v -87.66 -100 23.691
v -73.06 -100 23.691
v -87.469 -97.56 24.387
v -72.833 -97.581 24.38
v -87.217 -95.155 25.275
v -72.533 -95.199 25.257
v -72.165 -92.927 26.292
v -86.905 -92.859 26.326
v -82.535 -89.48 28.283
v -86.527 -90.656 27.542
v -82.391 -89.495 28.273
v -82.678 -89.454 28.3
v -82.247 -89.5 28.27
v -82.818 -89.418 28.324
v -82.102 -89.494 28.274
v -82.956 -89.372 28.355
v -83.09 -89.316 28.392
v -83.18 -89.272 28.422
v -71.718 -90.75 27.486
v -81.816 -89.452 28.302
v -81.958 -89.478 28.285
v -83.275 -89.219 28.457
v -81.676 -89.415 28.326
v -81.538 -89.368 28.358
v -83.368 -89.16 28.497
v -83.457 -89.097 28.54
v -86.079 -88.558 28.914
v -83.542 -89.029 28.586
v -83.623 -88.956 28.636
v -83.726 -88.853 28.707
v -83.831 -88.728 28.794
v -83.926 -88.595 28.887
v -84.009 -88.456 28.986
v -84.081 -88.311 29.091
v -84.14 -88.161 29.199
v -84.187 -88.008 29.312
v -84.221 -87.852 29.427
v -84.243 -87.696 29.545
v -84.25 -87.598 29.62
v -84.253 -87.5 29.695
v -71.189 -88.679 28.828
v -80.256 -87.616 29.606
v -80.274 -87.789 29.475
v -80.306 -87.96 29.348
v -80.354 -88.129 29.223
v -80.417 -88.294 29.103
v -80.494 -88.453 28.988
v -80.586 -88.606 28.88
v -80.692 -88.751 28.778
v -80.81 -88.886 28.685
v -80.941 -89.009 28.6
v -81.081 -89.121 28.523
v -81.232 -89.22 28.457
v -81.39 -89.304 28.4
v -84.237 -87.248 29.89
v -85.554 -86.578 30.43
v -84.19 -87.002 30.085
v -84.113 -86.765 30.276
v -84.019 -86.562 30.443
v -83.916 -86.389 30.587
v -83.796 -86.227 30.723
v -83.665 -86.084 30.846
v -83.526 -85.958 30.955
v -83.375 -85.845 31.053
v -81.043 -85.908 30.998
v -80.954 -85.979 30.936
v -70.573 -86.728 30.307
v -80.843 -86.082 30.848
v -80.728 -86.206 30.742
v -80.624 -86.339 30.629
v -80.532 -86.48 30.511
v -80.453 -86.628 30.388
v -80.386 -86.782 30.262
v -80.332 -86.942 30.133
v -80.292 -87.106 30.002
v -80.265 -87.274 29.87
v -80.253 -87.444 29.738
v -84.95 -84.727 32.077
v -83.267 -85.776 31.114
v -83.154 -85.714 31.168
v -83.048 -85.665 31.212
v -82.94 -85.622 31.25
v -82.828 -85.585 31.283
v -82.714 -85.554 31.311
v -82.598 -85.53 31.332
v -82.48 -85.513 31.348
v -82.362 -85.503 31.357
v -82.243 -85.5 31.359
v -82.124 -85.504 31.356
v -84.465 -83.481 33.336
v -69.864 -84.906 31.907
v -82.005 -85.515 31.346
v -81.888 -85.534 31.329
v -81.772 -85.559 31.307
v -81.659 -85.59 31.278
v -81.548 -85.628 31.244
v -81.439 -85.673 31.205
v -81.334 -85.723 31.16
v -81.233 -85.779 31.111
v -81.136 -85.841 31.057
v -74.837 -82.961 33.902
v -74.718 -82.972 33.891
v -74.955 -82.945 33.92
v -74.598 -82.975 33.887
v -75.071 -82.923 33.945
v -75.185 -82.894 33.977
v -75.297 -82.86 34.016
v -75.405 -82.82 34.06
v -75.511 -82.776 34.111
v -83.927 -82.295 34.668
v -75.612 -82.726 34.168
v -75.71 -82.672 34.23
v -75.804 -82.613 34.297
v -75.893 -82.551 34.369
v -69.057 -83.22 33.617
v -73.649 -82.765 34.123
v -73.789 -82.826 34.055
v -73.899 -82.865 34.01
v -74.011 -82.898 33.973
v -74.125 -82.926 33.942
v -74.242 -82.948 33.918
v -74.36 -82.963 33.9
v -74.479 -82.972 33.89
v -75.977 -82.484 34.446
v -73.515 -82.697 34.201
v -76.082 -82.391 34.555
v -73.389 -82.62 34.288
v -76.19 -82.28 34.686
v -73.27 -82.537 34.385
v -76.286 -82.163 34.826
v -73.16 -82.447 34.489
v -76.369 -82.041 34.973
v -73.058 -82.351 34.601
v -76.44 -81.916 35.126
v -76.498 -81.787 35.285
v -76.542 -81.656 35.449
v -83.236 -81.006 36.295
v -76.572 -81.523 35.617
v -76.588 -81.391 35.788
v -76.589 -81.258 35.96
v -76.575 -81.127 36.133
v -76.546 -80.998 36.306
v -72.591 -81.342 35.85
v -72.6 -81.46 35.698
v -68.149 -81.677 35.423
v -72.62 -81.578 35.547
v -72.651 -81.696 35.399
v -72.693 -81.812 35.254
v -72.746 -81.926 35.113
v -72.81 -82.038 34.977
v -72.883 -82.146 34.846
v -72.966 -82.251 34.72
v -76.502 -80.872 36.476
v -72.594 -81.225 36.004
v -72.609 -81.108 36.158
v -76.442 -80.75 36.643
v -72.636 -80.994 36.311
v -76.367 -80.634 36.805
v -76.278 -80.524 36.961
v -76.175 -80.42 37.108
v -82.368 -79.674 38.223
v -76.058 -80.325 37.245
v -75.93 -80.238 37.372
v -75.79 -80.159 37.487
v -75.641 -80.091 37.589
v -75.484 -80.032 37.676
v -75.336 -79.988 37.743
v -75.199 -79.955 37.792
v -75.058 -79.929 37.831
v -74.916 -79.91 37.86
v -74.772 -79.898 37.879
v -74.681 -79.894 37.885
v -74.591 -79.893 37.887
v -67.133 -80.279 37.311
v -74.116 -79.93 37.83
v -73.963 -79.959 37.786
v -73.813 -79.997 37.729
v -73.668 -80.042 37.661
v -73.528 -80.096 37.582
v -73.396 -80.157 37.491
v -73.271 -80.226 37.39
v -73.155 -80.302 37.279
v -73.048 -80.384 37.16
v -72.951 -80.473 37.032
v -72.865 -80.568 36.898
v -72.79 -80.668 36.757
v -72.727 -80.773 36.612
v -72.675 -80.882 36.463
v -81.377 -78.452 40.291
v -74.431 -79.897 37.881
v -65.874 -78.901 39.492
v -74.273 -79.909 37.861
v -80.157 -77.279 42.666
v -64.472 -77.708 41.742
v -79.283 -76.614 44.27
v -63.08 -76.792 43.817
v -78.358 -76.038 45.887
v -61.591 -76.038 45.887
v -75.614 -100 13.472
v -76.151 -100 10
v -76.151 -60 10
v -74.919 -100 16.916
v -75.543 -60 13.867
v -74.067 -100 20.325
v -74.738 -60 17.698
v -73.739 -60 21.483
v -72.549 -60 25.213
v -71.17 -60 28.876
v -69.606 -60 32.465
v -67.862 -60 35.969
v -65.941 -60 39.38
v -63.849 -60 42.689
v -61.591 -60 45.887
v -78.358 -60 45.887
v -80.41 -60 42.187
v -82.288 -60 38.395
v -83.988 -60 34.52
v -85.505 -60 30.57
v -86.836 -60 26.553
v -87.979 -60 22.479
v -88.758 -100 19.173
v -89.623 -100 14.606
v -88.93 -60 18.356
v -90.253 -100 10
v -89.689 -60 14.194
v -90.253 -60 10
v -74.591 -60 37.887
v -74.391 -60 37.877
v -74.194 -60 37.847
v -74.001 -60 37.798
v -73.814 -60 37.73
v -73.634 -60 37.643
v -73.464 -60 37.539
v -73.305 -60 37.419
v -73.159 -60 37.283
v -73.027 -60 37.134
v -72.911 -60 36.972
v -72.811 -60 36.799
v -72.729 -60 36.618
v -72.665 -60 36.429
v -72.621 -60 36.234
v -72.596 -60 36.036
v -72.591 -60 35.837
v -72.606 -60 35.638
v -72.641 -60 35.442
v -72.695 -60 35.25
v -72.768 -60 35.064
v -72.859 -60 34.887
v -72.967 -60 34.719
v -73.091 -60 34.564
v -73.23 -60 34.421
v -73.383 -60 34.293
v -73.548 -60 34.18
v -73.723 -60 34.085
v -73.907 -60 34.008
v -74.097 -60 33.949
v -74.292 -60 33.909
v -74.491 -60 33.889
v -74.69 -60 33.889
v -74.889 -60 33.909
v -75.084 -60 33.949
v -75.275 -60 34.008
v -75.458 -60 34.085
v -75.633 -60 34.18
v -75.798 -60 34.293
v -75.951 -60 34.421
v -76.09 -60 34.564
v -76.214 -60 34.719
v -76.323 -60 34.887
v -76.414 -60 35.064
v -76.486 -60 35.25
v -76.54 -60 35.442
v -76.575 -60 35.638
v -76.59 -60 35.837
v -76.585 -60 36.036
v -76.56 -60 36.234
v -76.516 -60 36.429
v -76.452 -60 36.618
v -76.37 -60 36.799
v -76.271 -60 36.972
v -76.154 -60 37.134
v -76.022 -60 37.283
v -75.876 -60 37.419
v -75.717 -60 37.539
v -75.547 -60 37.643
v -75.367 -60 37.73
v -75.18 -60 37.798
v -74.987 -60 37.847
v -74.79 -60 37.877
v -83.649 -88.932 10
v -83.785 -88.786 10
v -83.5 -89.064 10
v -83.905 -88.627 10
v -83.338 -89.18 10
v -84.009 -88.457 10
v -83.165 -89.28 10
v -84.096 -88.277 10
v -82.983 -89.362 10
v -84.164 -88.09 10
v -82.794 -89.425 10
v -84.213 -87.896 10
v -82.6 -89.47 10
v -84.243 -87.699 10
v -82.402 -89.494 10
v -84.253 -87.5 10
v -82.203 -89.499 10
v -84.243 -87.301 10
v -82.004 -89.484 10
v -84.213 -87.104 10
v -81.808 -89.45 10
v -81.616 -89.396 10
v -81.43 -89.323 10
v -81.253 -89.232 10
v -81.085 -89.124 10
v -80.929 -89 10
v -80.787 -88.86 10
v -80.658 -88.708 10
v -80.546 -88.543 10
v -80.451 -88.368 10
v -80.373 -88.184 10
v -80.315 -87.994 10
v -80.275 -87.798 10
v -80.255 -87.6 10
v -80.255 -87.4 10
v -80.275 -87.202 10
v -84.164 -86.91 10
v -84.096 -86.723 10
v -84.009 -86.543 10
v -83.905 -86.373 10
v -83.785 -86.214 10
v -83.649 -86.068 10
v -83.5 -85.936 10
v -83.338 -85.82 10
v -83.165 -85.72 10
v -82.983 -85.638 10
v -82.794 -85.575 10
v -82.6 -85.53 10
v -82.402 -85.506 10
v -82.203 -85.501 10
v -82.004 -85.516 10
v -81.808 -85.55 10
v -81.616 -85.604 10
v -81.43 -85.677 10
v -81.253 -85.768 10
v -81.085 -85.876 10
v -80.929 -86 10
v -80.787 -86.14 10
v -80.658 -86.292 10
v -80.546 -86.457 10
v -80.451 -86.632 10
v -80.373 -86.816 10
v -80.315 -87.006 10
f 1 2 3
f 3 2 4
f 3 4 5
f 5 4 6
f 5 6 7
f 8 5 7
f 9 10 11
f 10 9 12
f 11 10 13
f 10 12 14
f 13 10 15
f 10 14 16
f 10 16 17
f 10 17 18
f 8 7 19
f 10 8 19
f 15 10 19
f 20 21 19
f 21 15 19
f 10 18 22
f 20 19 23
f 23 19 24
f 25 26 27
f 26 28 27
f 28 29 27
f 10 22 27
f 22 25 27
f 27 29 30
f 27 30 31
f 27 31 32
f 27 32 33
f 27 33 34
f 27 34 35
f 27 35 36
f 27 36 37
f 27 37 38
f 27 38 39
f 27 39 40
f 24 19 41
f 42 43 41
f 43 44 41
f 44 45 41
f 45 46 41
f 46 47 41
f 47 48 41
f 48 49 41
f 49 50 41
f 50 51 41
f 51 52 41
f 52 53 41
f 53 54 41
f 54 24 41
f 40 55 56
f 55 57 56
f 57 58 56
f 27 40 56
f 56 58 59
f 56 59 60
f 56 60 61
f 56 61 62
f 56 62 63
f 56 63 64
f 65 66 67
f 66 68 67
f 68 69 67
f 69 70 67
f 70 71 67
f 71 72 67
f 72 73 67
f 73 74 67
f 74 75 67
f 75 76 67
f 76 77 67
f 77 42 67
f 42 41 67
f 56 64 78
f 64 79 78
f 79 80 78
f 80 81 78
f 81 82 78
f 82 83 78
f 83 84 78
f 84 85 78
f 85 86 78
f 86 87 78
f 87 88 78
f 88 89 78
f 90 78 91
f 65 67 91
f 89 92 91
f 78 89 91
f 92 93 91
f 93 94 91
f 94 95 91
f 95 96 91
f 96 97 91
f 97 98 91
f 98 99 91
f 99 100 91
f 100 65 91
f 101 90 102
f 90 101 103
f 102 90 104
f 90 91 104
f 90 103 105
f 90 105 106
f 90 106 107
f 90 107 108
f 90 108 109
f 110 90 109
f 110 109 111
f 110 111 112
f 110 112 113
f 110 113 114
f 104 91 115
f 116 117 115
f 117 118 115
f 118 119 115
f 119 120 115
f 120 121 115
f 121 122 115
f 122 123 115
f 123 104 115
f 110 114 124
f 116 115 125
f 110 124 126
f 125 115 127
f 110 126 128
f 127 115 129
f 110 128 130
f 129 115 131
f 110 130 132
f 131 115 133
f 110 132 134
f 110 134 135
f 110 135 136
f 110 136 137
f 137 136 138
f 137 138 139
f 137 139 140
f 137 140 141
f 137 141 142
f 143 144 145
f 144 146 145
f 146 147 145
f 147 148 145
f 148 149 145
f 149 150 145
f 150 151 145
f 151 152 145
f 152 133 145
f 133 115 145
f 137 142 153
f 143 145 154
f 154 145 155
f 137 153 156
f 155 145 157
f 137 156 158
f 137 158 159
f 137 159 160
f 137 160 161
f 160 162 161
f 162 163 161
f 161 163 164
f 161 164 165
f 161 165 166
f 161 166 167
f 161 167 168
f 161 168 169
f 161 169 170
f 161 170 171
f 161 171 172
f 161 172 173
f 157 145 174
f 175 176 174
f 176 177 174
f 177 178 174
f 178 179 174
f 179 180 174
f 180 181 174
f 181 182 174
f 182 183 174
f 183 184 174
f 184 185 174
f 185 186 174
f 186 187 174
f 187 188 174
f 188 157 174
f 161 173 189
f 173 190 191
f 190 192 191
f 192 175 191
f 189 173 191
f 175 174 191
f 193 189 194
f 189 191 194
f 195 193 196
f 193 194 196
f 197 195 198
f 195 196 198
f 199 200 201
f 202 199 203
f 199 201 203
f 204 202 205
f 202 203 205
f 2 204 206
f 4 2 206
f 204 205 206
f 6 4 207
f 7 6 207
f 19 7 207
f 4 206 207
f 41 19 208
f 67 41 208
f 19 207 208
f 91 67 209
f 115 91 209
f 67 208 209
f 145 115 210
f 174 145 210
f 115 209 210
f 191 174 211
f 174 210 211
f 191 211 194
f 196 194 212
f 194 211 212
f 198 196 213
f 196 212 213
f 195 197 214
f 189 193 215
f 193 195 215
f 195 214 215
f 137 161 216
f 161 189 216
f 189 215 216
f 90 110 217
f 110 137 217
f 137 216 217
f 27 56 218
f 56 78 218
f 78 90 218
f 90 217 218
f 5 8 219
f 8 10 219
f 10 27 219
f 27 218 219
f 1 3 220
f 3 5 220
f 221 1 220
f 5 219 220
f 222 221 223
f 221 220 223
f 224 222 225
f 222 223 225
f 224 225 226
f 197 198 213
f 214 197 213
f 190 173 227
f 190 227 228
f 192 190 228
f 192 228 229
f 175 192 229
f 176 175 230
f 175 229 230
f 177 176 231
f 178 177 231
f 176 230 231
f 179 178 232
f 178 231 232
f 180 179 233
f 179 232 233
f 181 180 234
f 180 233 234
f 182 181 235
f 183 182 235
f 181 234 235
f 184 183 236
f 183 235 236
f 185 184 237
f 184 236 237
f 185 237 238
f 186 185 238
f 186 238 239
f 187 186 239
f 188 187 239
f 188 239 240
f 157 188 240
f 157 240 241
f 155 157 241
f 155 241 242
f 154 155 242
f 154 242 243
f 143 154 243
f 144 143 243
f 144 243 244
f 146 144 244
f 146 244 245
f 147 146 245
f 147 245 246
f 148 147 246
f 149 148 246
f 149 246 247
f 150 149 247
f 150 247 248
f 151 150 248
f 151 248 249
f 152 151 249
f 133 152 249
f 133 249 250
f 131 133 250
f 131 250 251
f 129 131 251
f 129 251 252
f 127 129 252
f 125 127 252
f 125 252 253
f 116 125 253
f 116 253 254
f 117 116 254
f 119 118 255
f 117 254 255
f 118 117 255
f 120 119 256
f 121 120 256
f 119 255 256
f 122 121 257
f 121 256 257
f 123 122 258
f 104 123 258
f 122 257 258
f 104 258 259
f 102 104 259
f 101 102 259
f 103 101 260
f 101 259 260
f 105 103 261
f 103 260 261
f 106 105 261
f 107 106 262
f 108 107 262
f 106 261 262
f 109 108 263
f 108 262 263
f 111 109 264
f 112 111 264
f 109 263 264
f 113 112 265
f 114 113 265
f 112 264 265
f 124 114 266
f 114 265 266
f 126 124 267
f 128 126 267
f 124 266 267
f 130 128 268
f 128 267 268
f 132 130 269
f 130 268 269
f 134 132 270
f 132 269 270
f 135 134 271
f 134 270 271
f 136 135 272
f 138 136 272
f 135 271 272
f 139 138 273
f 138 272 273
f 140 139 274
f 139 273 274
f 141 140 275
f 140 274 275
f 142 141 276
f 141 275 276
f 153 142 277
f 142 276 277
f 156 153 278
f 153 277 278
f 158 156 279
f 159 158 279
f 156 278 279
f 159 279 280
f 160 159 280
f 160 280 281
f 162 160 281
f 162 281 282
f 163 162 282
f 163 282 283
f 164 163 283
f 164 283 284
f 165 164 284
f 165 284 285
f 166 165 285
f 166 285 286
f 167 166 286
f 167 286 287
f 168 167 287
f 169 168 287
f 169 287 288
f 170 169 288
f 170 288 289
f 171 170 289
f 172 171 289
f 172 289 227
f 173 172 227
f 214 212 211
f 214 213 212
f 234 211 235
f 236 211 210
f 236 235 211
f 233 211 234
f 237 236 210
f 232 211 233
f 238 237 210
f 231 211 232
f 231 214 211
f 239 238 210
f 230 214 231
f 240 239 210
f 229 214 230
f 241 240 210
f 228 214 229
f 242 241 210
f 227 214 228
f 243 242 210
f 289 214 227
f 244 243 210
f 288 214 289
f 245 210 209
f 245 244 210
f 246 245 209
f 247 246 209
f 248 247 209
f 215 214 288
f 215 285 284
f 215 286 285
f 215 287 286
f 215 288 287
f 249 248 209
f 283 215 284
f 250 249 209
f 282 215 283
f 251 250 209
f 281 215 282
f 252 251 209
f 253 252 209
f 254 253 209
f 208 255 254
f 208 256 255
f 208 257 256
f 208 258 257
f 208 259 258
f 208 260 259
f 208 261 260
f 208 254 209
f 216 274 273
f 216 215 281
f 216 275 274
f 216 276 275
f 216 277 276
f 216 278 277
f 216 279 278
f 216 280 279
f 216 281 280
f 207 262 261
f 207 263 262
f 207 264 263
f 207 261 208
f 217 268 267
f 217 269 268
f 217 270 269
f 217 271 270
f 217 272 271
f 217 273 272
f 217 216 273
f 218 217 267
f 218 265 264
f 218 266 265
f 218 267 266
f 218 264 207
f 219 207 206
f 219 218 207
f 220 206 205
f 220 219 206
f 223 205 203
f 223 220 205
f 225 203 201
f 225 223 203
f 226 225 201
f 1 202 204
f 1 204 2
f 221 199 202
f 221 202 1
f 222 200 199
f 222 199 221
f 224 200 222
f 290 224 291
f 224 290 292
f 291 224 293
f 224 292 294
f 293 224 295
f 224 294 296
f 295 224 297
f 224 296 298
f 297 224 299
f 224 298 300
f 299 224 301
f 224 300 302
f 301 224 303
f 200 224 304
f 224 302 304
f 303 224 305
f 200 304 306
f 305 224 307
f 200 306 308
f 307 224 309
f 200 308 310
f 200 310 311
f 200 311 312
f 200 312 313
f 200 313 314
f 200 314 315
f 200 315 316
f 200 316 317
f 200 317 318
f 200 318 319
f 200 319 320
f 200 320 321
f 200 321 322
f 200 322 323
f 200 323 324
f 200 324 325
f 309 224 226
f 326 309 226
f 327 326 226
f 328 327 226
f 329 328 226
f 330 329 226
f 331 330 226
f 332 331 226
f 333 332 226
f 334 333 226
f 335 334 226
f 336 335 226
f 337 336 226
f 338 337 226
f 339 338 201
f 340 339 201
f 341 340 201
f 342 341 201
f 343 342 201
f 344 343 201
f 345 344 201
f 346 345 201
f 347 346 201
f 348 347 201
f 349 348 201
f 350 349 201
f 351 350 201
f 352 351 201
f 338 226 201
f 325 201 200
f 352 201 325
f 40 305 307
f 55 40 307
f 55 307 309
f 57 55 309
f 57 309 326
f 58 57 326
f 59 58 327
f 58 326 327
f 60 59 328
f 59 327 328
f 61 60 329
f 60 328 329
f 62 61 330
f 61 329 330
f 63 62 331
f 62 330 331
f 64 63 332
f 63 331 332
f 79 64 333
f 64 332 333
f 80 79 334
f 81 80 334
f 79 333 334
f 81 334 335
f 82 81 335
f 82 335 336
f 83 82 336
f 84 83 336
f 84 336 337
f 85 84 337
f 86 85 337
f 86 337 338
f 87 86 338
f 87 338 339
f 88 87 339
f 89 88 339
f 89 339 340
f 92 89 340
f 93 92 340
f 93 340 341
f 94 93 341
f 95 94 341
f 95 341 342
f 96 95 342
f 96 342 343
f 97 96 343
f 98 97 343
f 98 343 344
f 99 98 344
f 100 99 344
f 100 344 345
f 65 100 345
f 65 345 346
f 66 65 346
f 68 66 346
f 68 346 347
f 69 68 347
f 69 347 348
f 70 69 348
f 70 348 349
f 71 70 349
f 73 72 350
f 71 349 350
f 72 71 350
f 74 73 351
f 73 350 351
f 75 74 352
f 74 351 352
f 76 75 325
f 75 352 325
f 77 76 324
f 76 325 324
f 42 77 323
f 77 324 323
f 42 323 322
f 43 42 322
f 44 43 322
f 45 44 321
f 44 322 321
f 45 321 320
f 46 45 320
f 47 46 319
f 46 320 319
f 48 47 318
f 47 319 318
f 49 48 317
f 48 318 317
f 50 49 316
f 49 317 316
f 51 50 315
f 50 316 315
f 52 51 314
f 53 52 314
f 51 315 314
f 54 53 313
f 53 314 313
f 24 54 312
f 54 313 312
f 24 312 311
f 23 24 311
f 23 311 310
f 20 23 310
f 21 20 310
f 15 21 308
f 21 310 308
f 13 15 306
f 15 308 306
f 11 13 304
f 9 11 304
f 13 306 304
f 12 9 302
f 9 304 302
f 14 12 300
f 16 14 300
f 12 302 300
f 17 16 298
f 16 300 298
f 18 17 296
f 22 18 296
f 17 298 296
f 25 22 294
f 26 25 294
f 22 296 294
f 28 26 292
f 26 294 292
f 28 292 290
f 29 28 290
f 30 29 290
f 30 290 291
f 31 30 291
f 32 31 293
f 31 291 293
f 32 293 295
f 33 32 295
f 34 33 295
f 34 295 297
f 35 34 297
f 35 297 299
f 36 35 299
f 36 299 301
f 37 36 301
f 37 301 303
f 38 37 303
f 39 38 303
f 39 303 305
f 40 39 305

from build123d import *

# Parameters (mm, degrees)
BOSS_EXTRUDE1_DEPTH      = 60
SKETCH25_W               = 5.5
SKETCH25_H               = 17
BOSS_EXTRUDE3_DEPTH      = 20
FILLET1_R                = 2.3
SKETCH28_W               = 8
SKETCH28_H               = 10
CUT_EXTRUDE17_DEPTH      = 265
CUT_EXTRUDE19_DEPTH      = 165.638713704
CUT_EXTRUDE19_DEPTH_BACK = 165.638713704
SKETCH30_W               = 183.61
SKETCH30_H               = 30
CUT_EXTRUDE20_DEPTH      = 165.638713704
CUT_EXTRUDE20_DEPTH_BACK = 165.638713704
SKETCH32_W               = 3
SKETCH32_H               = 14
BOSS_EXTRUDE4_DEPTH      = 40
CUT_EXTRUDE21_DEPTH      = 90
CUT_EXTRUDE22_DEPTH      = 164.320868502
CUT_EXTRUDE22_DEPTH_BACK = 164.320868502
SKETCH39_R               = 2
CUT_EXTRUDE23_DEPTH      = 88
SKETCH40_R               = 2
CUT_EXTRUDE24_DEPTH      = 88


with BuildPart() as part:
    # Sketch1 → Boss-Extrude1 (new body)
    with BuildSketch(Plane(origin=(0, 0, 0), x_dir=(1, 0, 0), z_dir=(0, 1, 0))):
        with BuildLine():
            Line((91.805, -10), (90.252689849, -10))
            ThreePointArc((90.252689849, -10), (0, -90.805), (-90.252689849, -10))
            Line((-90.252689849, -10), (-91.805, -10))
            Line((-91.805, -10), (-91.805, 20))
            Line((-91.805, 20), (-76.805, 20))
            Line((-76.805, 20), (-76.805, 0))
            ThreePointArc((-76.805, 0), (0, -76.805), (76.805, 0))
            Line((76.805, 0), (76.805, 20))
            Line((76.805, 20), (91.805, 20))
            Line((91.805, 20), (91.805, -10))
        make_face()
    extrude(amount=-BOSS_EXTRUDE1_DEPTH)

    # Sketch25 → Boss-Extrude3 (add)
    with BuildSketch(Plane(origin=(0, -60, 0), x_dir=(-1, 0, 0), z_dir=(0, -1, 0))):
        with Locations((84.305, 5)):
            Rectangle(SKETCH25_W, SKETCH25_H)
        with Locations((-84.305, 5)):
            Rectangle(SKETCH25_W, SKETCH25_H)
    extrude(amount=BOSS_EXTRUDE3_DEPTH)

    # Fillet1
    fillet1_edges = [part.edges().sort_by_distance(p)[0] for p in [
        (84.305, -60, 3.5),
        (81.555, -60, -5),
        (87.055, -60, -5),
        (84.305, -60, -13.5),
        (-84.305, -60, 3.5),
        (-87.055, -60, -5),
        (-81.555, -60, -5),
        (-84.305, -60, -13.5),
    ]]
    fillet(fillet1_edges, radius=FILLET1_R)

    # Sketch28 → Cut-Extrude17 (cut)
    with BuildSketch(Plane(origin=(91.805, 0, 0), x_dir=(0, 0, -1), z_dir=(1, 0, 0))):
        with Locations((5, -42)):
            Rectangle(SKETCH28_W, SKETCH28_H)
    extrude(amount=-CUT_EXTRUDE17_DEPTH, mode=Mode.SUBTRACT)

    # Sketch30 → Cut-Extrude19 (cut, two sides: drawn at the far end of the back side and taken through both)
    with BuildSketch(Plane(origin=(0, 0, -20), x_dir=(-1, 0, 0), z_dir=(0, 0, -1)).offset(-CUT_EXTRUDE19_DEPTH_BACK)):
        with Locations((0, -15)):
            Rectangle(SKETCH30_W, SKETCH30_H)
    extrude(amount=CUT_EXTRUDE19_DEPTH + CUT_EXTRUDE19_DEPTH_BACK, mode=Mode.SUBTRACT)

    # Sketch32 → Cut-Extrude20 (cut, two sides: drawn at the far end of the back side and taken through both)
    with BuildSketch(Plane(origin=(0, 0, -20), x_dir=(-1, 0, 0), z_dir=(0, 0, -1)).offset(-CUT_EXTRUDE20_DEPTH_BACK)):
        with Locations((-65.13523483, -44)):
            Rectangle(SKETCH32_W, SKETCH32_H)
        with Locations((-51.773928511, -44)):
            Rectangle(SKETCH32_W, SKETCH32_H)
        with Locations((-84.305, -46)):
            Rectangle(SKETCH32_W, SKETCH32_H)
        with Locations((65.13523483, -44)):
            Rectangle(SKETCH32_W, SKETCH32_H)
        with Locations((51.773928511, -44)):
            Rectangle(SKETCH32_W, SKETCH32_H)
        with Locations((84.305, -46)):
            Rectangle(SKETCH32_W, SKETCH32_H)
    extrude(amount=CUT_EXTRUDE20_DEPTH + CUT_EXTRUDE20_DEPTH_BACK, mode=Mode.SUBTRACT)

    # Sketch33 → Boss-Extrude4 (add)
    with BuildSketch(Plane(origin=(0, -60, 0), x_dir=(-1, 0, 0), z_dir=(0, -1, 0))):
        with BuildLine():
            Line((90.252689849, -10), (76.151218145, -10))
            ThreePointArc((76.151218145, -10), (71.169996018, -28.876282513), (61.590580503, -45.886909008))
            Line((61.590580503, -45.886909008), (73.898492454, -52.768938193))
            ThreePointArc((73.898492454, -52.768938193), (84.815671791, -32.432234638), (90.252689849, -10))
        make_face()
    extrude(amount=BOSS_EXTRUDE4_DEPTH)

    # Sketch37 → Cut-Extrude21 (cut)
    with BuildSketch(Plane(origin=(0, 0, 0), x_dir=(0, 0, -1), z_dir=(1, 0, 0))):
        with BuildLine():
            Line((-0.881303102, -100), (-23.690614963, -100))
            ThreePointArc((-23.690614963, -100), (-31.684760451, -85.14357588), (-45.886909008, -76.037606625))
            Line((-45.886909008, -76.037606625), (-45.886909008, -59.917167305))
            Line((-45.886909008, -59.917167305), (-66.948234535, -59.917167305))
            Line((-66.948234535, -59.917167305), (-63.746381293, -92.441906362))
            Line((-63.746381293, -92.441906362), (-47.571757556, -115.346464391))
            Line((-47.571757556, -115.346464391), (-8.086377987, -115.346464391))
            Line((-8.086377987, -115.346464391), (-0.881303102, -100))
        make_face()
    extrude(amount=-CUT_EXTRUDE21_DEPTH, mode=Mode.SUBTRACT)

    # Sketch38 → Cut-Extrude22 (cut, two sides: drawn at the far end of the back side and taken through both)
    with BuildSketch(Plane(origin=(0, 0, 0), x_dir=(0, 0, -1), z_dir=(1, 0, 0)).offset(-CUT_EXTRUDE22_DEPTH_BACK)):
        Polygon((20, -30), (-90.805, -30), (-90.805, -60), (-10, -60), (-10, -100), (20, -100), (20, -60), align=None)
    extrude(amount=CUT_EXTRUDE22_DEPTH + CUT_EXTRUDE22_DEPTH_BACK, mode=Mode.SUBTRACT)

    # Sketch39 → Cut-Extrude23 (cut)
    with BuildSketch(Plane(origin=(0, 0, 10), x_dir=(-1, 0, 0), z_dir=(0, 0, -1))):
        with Locations((82.252689849, -87.5)):
            Circle(SKETCH39_R)
    extrude(amount=-CUT_EXTRUDE23_DEPTH, mode=Mode.SUBTRACT)

    # Sketch40 → Cut-Extrude24 (cut)
    with BuildSketch(Plane(origin=(0, -60, 0), x_dir=(1, 0, 0), z_dir=(0, 1, 0))):
        with Locations(Location((-74.590580503, -35.886909008, 0), (0, 0, 270))):
            Circle(SKETCH40_R)
    extrude(amount=-CUT_EXTRUDE24_DEPTH, mode=Mode.SUBTRACT)


solid = part.part
